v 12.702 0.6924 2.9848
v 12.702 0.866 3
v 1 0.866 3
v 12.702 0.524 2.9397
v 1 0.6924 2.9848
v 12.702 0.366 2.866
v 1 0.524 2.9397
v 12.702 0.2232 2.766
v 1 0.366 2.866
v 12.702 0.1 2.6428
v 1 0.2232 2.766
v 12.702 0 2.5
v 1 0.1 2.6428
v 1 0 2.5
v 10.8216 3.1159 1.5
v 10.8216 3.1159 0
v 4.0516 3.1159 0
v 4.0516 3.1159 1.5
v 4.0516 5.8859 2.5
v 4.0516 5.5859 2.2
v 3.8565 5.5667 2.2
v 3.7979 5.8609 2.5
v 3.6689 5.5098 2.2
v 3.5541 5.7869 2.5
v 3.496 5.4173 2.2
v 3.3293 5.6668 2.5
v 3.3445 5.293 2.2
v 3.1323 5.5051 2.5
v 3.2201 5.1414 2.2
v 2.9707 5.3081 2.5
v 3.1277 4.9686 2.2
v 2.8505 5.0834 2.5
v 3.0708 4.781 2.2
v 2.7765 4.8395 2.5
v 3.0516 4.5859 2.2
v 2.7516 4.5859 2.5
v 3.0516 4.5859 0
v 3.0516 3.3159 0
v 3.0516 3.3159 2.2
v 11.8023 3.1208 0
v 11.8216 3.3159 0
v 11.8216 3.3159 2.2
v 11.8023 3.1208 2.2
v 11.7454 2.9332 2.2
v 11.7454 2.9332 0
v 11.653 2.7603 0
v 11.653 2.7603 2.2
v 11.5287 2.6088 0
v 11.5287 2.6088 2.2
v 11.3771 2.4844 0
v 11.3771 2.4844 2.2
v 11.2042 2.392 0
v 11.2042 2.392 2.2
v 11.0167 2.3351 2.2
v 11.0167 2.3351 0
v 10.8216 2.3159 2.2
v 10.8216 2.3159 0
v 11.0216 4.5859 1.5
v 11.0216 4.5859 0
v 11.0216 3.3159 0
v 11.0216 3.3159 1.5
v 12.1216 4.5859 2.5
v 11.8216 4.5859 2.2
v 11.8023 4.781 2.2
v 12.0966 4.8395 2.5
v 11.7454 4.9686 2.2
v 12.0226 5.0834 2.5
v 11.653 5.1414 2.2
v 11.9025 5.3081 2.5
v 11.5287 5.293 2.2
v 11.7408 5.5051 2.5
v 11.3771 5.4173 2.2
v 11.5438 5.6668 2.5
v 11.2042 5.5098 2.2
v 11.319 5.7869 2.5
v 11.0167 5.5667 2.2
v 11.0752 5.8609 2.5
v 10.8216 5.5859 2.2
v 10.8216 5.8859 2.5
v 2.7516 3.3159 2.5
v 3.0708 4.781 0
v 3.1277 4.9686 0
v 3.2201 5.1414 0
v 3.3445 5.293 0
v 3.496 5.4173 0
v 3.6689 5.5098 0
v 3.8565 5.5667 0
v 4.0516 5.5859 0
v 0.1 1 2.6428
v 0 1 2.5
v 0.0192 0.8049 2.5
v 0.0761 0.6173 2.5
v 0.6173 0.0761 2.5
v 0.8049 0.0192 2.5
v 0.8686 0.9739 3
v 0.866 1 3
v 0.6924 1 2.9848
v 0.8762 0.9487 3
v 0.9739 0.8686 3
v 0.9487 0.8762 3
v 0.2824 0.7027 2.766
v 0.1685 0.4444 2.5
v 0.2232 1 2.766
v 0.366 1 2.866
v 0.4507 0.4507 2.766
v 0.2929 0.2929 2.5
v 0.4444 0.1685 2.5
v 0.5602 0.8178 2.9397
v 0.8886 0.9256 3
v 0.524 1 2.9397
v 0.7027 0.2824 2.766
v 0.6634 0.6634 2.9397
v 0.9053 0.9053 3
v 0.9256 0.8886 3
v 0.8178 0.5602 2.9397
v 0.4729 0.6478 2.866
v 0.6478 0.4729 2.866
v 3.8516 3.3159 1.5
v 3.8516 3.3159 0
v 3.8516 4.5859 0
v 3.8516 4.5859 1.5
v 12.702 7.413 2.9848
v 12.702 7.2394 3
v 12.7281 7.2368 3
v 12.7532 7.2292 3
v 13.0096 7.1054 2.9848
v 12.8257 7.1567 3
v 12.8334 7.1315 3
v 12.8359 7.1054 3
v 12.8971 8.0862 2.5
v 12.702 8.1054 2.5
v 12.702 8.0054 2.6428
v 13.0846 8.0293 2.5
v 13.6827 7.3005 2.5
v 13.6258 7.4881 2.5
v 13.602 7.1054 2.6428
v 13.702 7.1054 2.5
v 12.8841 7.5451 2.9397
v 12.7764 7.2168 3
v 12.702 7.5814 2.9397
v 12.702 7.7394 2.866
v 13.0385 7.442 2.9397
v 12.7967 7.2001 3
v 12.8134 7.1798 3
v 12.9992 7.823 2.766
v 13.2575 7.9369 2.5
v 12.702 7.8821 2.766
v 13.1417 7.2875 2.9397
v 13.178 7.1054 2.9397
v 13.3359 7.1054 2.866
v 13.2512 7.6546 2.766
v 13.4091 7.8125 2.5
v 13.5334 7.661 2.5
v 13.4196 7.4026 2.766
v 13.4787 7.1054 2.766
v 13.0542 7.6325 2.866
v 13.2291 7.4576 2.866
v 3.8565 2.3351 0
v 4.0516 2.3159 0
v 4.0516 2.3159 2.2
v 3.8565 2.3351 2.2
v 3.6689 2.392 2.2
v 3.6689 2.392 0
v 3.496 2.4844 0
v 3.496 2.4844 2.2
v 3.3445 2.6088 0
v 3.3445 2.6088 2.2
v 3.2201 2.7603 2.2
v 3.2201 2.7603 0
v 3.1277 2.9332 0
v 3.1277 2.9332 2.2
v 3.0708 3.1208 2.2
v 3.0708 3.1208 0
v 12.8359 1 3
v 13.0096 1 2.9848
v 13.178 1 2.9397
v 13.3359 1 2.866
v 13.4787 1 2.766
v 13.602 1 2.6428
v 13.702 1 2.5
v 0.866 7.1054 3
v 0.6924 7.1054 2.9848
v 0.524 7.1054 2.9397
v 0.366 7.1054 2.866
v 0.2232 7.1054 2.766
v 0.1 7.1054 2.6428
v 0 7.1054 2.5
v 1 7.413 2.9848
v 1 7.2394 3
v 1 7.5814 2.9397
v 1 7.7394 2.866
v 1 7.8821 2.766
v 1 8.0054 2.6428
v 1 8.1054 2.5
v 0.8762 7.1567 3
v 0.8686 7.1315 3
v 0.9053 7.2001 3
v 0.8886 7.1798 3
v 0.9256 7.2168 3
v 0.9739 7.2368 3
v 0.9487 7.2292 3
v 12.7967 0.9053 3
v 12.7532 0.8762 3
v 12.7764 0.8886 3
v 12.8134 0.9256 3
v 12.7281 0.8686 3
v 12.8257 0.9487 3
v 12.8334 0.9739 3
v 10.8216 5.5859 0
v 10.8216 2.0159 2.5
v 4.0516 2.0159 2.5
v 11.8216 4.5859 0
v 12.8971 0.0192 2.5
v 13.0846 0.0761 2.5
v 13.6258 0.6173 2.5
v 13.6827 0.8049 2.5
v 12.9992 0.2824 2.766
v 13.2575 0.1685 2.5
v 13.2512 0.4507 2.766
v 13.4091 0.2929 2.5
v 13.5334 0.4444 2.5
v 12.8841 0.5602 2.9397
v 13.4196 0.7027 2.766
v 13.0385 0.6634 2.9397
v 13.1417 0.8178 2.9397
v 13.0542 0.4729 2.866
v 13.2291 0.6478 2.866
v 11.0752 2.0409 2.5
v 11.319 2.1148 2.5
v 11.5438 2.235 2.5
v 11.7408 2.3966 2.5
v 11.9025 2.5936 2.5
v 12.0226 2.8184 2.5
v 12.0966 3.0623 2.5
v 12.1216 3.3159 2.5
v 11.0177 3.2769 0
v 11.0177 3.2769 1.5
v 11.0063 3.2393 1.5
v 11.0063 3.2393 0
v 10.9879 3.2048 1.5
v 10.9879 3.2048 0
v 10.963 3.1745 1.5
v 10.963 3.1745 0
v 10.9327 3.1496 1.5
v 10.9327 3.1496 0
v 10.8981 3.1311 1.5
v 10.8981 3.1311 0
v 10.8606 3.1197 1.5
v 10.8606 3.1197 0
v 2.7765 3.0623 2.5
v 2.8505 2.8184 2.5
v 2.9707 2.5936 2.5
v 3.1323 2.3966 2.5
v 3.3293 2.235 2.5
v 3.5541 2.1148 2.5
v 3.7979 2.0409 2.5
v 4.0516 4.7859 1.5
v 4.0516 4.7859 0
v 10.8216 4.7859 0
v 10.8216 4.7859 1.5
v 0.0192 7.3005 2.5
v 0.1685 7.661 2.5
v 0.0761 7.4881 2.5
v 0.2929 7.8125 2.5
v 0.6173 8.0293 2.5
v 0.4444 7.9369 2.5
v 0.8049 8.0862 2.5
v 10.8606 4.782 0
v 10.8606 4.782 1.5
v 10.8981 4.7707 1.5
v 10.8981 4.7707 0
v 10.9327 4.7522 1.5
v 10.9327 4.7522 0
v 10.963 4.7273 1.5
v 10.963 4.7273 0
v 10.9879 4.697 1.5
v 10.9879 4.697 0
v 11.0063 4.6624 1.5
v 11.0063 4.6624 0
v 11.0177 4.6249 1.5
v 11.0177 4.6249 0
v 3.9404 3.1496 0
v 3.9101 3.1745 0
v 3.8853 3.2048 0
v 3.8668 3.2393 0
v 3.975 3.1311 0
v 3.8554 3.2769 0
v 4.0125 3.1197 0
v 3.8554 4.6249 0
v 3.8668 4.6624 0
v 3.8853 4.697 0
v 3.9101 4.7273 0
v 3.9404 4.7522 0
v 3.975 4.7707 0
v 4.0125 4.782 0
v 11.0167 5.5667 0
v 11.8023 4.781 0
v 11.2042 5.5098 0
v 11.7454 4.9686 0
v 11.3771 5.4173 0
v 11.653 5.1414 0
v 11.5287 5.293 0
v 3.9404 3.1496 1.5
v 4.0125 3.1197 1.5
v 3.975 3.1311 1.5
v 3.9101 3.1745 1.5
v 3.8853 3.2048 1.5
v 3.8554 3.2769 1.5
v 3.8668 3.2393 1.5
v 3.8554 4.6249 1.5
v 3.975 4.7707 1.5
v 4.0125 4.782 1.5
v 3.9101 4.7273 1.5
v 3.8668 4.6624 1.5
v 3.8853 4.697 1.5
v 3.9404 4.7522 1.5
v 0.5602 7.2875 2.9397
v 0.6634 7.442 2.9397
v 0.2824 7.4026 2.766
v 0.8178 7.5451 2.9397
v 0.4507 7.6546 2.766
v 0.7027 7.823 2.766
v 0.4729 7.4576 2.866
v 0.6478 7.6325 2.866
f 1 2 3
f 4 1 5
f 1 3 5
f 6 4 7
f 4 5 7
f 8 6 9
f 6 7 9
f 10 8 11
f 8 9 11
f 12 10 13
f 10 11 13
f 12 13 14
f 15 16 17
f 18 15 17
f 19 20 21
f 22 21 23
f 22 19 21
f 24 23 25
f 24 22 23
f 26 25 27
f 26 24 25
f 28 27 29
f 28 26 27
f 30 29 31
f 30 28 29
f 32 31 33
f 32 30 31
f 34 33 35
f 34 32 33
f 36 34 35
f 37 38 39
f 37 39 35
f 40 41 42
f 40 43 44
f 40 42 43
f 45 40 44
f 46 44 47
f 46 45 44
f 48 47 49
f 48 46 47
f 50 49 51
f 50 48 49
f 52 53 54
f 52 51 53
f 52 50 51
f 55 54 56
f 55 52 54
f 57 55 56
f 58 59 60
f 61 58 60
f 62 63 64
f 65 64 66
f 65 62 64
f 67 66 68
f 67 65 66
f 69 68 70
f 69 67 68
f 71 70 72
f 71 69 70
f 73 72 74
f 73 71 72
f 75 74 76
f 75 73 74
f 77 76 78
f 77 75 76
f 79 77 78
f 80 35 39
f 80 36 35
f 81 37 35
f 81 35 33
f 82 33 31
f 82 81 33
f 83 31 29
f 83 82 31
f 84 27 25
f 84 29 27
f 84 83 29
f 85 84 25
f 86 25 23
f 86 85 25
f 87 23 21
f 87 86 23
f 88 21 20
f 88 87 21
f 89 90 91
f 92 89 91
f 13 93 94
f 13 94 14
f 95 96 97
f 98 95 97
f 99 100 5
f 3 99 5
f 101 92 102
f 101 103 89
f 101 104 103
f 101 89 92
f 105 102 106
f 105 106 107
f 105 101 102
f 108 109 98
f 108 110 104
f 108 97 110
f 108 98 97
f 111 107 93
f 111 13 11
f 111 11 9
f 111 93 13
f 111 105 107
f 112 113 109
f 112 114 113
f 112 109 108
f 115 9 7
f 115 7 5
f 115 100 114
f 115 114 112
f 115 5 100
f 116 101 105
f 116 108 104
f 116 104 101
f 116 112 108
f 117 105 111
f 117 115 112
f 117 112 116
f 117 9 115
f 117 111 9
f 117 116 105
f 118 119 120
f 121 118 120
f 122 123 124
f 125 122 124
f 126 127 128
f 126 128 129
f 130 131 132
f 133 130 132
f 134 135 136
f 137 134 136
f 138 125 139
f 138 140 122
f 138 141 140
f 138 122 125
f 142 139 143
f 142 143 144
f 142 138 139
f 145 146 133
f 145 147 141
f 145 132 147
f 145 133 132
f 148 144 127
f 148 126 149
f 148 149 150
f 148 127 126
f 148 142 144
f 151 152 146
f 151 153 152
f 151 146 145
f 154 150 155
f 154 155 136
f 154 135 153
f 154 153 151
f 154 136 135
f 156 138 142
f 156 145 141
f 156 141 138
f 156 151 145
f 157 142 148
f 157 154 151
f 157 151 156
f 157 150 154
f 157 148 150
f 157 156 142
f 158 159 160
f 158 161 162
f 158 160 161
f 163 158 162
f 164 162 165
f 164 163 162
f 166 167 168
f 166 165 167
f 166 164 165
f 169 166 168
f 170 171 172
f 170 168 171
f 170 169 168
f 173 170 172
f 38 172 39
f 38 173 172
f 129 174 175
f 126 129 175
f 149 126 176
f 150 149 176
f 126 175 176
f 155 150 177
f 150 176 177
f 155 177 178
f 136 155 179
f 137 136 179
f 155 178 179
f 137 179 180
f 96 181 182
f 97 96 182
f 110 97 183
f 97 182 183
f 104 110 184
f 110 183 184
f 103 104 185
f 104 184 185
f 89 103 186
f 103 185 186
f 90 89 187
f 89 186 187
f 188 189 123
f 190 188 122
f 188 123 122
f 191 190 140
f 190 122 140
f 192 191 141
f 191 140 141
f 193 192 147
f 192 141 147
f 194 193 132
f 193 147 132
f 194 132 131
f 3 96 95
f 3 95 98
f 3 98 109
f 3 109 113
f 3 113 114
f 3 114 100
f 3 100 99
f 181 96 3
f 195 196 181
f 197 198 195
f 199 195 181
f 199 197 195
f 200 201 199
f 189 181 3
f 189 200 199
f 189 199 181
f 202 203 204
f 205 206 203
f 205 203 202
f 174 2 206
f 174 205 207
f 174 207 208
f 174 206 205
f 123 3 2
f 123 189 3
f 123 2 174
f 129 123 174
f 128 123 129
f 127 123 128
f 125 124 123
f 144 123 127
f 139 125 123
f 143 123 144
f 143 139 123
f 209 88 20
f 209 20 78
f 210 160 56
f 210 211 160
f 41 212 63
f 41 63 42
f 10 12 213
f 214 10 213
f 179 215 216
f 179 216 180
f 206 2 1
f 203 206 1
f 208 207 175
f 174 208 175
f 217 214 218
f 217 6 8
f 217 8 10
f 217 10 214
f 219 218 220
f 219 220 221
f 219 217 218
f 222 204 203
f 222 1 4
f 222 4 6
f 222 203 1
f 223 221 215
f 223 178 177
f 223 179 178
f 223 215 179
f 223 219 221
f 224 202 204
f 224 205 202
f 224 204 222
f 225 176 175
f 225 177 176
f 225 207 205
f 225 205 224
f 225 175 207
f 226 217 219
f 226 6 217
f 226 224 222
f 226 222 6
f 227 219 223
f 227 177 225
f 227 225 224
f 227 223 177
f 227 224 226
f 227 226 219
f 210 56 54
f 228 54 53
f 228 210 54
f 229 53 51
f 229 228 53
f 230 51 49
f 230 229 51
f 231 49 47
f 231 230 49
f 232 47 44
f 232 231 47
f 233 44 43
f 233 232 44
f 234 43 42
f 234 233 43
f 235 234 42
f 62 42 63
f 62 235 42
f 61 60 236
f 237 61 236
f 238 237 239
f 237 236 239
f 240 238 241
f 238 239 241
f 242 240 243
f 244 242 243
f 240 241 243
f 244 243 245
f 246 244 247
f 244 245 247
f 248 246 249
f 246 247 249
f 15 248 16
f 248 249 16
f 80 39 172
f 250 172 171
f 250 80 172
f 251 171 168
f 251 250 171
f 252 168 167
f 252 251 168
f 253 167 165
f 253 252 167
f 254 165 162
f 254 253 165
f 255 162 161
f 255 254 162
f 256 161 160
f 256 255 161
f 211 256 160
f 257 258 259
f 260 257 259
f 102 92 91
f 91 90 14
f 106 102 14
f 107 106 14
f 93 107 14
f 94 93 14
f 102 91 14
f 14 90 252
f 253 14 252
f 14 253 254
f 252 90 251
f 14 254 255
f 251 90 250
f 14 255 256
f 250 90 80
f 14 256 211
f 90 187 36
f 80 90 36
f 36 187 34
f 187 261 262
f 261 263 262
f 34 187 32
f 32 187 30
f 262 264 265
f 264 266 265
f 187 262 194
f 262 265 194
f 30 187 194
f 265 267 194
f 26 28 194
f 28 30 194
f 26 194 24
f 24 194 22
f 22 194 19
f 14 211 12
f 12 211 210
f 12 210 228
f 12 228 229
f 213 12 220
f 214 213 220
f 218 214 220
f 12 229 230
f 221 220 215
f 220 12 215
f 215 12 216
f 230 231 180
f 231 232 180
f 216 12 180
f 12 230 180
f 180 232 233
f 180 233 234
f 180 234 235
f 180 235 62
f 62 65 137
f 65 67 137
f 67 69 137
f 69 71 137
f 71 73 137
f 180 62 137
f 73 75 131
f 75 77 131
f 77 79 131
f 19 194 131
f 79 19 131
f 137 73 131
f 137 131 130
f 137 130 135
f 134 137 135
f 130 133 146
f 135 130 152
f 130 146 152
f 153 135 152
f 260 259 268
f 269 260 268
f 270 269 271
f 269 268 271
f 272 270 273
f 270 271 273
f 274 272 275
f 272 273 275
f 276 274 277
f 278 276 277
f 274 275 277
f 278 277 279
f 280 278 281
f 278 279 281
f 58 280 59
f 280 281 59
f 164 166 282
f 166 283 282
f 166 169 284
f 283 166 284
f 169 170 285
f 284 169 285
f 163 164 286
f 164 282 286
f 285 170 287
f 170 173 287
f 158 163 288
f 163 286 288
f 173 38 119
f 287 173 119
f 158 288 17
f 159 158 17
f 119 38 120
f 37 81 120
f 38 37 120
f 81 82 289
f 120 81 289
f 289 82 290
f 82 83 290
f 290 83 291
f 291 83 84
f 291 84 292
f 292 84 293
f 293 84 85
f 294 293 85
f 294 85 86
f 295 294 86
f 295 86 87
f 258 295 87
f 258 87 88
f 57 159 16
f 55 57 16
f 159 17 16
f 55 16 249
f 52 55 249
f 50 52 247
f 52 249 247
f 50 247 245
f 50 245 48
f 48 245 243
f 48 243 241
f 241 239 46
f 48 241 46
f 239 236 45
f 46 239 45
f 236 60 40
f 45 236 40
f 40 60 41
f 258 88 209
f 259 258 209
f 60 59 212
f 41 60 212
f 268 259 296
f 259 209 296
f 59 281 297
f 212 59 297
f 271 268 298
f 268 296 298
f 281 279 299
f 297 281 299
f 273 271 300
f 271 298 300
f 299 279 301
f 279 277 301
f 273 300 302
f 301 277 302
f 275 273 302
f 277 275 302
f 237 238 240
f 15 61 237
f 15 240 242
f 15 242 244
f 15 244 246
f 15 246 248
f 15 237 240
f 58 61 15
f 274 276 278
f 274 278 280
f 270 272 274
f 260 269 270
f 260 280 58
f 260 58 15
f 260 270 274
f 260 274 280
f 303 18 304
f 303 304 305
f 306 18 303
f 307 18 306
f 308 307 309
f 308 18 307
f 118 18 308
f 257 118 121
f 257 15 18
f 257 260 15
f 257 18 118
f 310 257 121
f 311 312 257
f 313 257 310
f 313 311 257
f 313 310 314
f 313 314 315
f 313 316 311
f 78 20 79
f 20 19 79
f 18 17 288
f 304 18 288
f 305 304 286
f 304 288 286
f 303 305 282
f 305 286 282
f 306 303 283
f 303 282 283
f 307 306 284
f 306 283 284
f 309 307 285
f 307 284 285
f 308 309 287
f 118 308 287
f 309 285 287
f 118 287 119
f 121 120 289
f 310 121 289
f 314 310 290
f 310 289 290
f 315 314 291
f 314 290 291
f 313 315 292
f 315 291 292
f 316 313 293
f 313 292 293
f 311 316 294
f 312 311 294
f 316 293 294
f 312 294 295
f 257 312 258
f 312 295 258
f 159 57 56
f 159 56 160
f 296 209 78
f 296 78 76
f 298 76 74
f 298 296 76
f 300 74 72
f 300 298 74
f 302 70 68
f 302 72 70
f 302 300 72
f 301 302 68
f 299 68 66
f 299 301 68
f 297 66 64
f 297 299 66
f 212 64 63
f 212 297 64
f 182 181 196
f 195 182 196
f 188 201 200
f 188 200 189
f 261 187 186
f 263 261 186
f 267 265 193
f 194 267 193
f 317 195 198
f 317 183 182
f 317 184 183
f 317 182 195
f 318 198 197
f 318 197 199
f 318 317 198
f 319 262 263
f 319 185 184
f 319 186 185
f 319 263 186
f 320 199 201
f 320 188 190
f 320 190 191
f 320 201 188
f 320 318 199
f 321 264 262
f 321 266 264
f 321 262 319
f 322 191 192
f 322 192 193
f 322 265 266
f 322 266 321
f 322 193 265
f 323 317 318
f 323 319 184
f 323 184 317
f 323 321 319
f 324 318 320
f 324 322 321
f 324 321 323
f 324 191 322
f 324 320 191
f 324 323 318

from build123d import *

# Parameters (mm, degrees)
SKETCH1_W           = 13.701960198
SKETCH1_H           = 8.105384906
BOSS_EXTRUDE1_DEPTH = 3
CAVITY1_OUTLINE_W   = 13.701960198
CAVITY1_OUTLINE_H   = 8.105384906
CAVITY1_DEPTH       = 2.5
CUT_EXTRUDE1_DEPTH  = 1.5
FILLET1_R           = 1
FILLET2_R           = 1


with BuildPart() as part:
    # Sketch1 → Boss-Extrude1 (new body)
    with BuildSketch(Plane.XY):
        with Locations((6.850980099, 4.052692453)):
            Rectangle(SKETCH1_W, SKETCH1_H)
    extrude(amount=BOSS_EXTRUDE1_DEPTH)

    # Cavity1: read off the stored shape, not the designer's step
    # Cavity1 outline → Cavity1 (cut)
    with BuildSketch(Plane.XY):
        with Locations((6.850980099, 4.052692453)):
            Rectangle(CAVITY1_OUTLINE_W, CAVITY1_OUTLINE_H)
        with BuildLine():
            Line((11.821561481, 4.585876247), (11.821561481, 3.315876247))
            ThreePointArc((11.821561481, 3.315876247), (11.528668262, 2.608769466), (10.821561481, 2.315876247))
            Line((10.821561481, 2.315876247), (4.051561481, 2.315876247))
            ThreePointArc((4.051561481, 2.315876247), (3.3444547, 2.608769466), (3.051561481, 3.315876247))
            Line((3.051561481, 3.315876247), (3.051561481, 4.585876247))
            ThreePointArc((3.051561481, 4.585876247), (3.3444547, 5.292983028), (4.051561481, 5.585876247))
            Line((4.051561481, 5.585876247), (10.821561481, 5.585876247))
            ThreePointArc((10.821561481, 5.585876247), (11.528668262, 5.292983028), (11.821561481, 4.585876247))
        make_face(mode=Mode.SUBTRACT)
    extrude(amount=CAVITY1_DEPTH, mode=Mode.SUBTRACT)

    # Cavity1 2: loft between two sections, ruled curve by curve
    cavity1_2_from = [
        Edge.make_three_point_arc((3.051561481, 3.315876247, 2.2), (3.3444547, 2.608769466, 2.2), (4.051561481, 2.315876247, 2.2)),
        Edge.make_three_point_arc((4.051561481, 5.585876247, 2.2), (3.3444547, 5.292983028, 2.2), (3.051561481, 4.585876247, 2.2)),
        Edge.make_three_point_arc((10.821561481, 2.315876247, 2.2), (11.528668262, 2.608769466, 2.2), (11.821561481, 3.315876247, 2.2)),
        Edge.make_three_point_arc((11.821561481, 4.585876247, 2.2), (11.528668262, 5.292983028, 2.2), (10.821561481, 5.585876247, 2.2)),
        Edge.make_line((3.051561481, 4.585876247, 2.2), (3.051561481, 3.315876247, 2.2)),
        Edge.make_line((4.051561481, 2.315876247, 2.2), (10.821561481, 2.315876247, 2.2)),
        Edge.make_line((4.051561481, 5.585876247, 2.2), (10.821561481, 5.585876247, 2.2)),
        Edge.make_line((11.821561481, 3.315876247, 2.2), (11.821561481, 4.585876247, 2.2)),
    ]
    cavity1_2_to = [
        Edge.make_three_point_arc((2.751561481, 3.315876247, 2.5), (3.132322665, 2.396637431, 2.5), (4.051561481, 2.015876247, 2.5)),
        Edge.make_three_point_arc((4.051561481, 5.885876247, 2.5), (3.132322665, 5.505115063, 2.5), (2.751561481, 4.585876247, 2.5)),
        Edge.make_three_point_arc((10.821561481, 2.015876247, 2.5), (11.740800297, 2.396637431, 2.5), (12.121561481, 3.315876247, 2.5)),
        Edge.make_three_point_arc((12.121561481, 4.585876247, 2.5), (11.740800297, 5.505115063, 2.5), (10.821561481, 5.885876247, 2.5)),
        Edge.make_line((2.751561481, 4.585876247, 2.5), (2.751561481, 3.315876247, 2.5)),
        Edge.make_line((4.051561481, 2.015876247, 2.5), (10.821561481, 2.015876247, 2.5)),
        Edge.make_line((4.051561481, 5.885876247, 2.5), (10.821561481, 5.885876247, 2.5)),
        Edge.make_line((12.121561481, 3.315876247, 2.5), (12.121561481, 4.585876247, 2.5)),
    ]
    cavity1_2 = Solid(Shell([*[Face.make_surface_from_curves(cavity1_2_from[k], cavity1_2_to[k]) for k in range(8)], Face(Wire(cavity1_2_from)), Face(Wire(cavity1_2_to))]))
    add(cavity1_2)

    # Sketch2 → Cut-Extrude1 (cut)
    with BuildSketch(Plane(origin=(0, 0, 0), x_dir=(-1, 0, 0), z_dir=(0, 0, -1))):
        with BuildLine():
            Line((-3.851561481, 3.315876247), (-3.851561481, 4.585876247))
            ThreePointArc((-3.851561481, 4.585876247), (-3.910140125, 4.727297603), (-4.051561481, 4.785876247))
            Line((-4.051561481, 4.785876247), (-10.821561481, 4.785876247))
            ThreePointArc((-10.821561481, 4.785876247), (-10.962982837, 4.727297603), (-11.021561481, 4.585876247))
            Line((-11.021561481, 4.585876247), (-11.021561481, 3.315876247))
            ThreePointArc((-11.021561481, 3.315876247), (-10.962982837, 3.174454891), (-10.821561481, 3.115876247))
            Line((-10.821561481, 3.115876247), (-4.051561481, 3.115876247))
            ThreePointArc((-4.051561481, 3.115876247), (-3.910140125, 3.174454891), (-3.851561481, 3.315876247))
        make_face()
    extrude(amount=-CUT_EXTRUDE1_DEPTH, mode=Mode.SUBTRACT)

    # Fillet1
    fillet1_edges = [part.edges().sort_by_distance(p)[0] for p in [
        (0, 8.105384906, 2.75),
        (13.701960198, 8.105384906, 2.75),
        (13.701960198, 0, 2.75),
        (0, 0, 2.75),
    ]]
    fillet(fillet1_edges, radius=FILLET1_R)

    # Fillet2
    # the kernel refuses this fillet: 1 mm, written as the material it takes off along each edge
    with BuildSketch(Plane(origin=(1, 1, 3), x_dir=(-1, 0, 0), z_dir=(0, 1, 0))) as fillet2_piece_1:
        with BuildLine():
            CenterArc((0.133974596, -1), FILLET2_R, 30, 60)
            Line((0.133974596, 0), (0.133974596, 0.02))
            Line((0.133974596, 0.02), (1, 0.02))
            Line((1, 0.02), (1.02, 0))
            ThreePointArc((1.02, 0), (1.02, -0.25), (1.017320508, -0.49))
            Line((1.017320508, -0.49), (1, -0.5))
        make_face()
    revolve(axis=Axis((1, 1, 3), (0, 0, 1)), revolution_arc=90, mode=Mode.SUBTRACT)
    with BuildSketch(Plane(origin=(0, 7.105384906, 3), x_dir=(0, 0, -1), z_dir=(0, -1, 0)), Plane(origin=(13.701960198, 1, 3), x_dir=(-5.230269550793082e-10, 0, -1.0), z_dir=(0, 1, 0))) as fillet2_piece_2:
        with BuildLine():
            CenterArc((1, 0.866025404), FILLET2_R, 180, 60)
            Line((0, 0.866025404), (-0.02, 0.866025404))
            Line((-0.02, 0.866025404), (-0.02, 0))
            Line((-0.02, 0), (0, -0.02))
            ThreePointArc((0, -0.02), (0.25, -0.02), (0.49, -0.017320508))
            Line((0.49, -0.017320508), (0.5, 0))
        make_face()
    extrude(amount=6.105384906, mode=Mode.SUBTRACT)
    with BuildSketch(Plane(origin=(1, 7.105384906, 3), x_dir=(-1, 0, 0), z_dir=(0, -1, 0))) as fillet2_piece_3:
        with BuildLine():
            CenterArc((0.133974596, 1), FILLET2_R, 270, 60)
            Line((0.133974596, 0), (0.133974596, -0.02))
            Line((0.133974596, -0.02), (1, -0.02))
            Line((1, -0.02), (1.02, 0))
            ThreePointArc((1.02, 0), (1.02, 0.25), (1.017320508, 0.49))
            Line((1.017320508, 0.49), (1, 0.5))
        make_face()
    revolve(axis=Axis((1, 7.105384906, 3), (0, 0, -1)), revolution_arc=90, mode=Mode.SUBTRACT)
    with BuildSketch(Plane(origin=(12.701960198, 8.105384906, 3), x_dir=(0, -2.7725377549357952e-11, -1.0), z_dir=(-1, 0, 0)), Plane(origin=(1, 0, 3), x_dir=(0, 0, -1), z_dir=(1, 0, 0))) as fillet2_piece_4:
        with BuildLine():
            CenterArc((1, 0.866025404), FILLET2_R, 179.999999998, 60)
            Line((0, 0.866025404), (-0.02, 0.866025404))
            Line((-0.02, 0.866025404), (-0.02, 0))
            Line((-0.02, 0), (0, -0.02))
            ThreePointArc((0, -0.02), (0.25, -0.02), (0.49, -0.017320508))
            Line((0.49, -0.017320508), (0.5, 0))
        make_face()
    extrude(amount=11.701960198, mode=Mode.SUBTRACT)
    with BuildSketch(Plane(origin=(12.701960198, 7.105384906, 3), x_dir=(0, 1, 0), z_dir=(-1, 0, 0))) as fillet2_piece_5:
        with BuildLine():
            CenterArc((0.133974596, 1), FILLET2_R, 270, 60)
            Line((0.133974596, 0), (0.133974596, -0.02))
            Line((0.133974596, -0.02), (1, -0.02))
            Line((1, -0.02), (1.02, 0))
            ThreePointArc((1.02, 0), (1.02, 0.25), (1.017320508, 0.49))
            Line((1.017320508, 0.49), (1, 0.5))
        make_face()
    revolve(axis=Axis((12.701960198, 7.105384906, 3), (0, 0, -1)), revolution_arc=90, mode=Mode.SUBTRACT)
    with BuildSketch(Plane(origin=(12.701960198, 1, 3), x_dir=(0, -1, 0), z_dir=(-1, 0, 0))) as fillet2_piece_6:
        with BuildLine():
            CenterArc((0.133974596, -1), FILLET2_R, 30, 60)
            Line((0.133974596, 0), (0.133974596, 0.02))
            Line((0.133974596, 0.02), (1, 0.02))
            Line((1, 0.02), (1.02, 0))
            ThreePointArc((1.02, 0), (1.02, -0.25), (1.017320508, -0.49))
            Line((1.017320508, -0.49), (1, -0.5))
        make_face()
    revolve(axis=Axis((12.701960198, 1, 3), (0, 0, 1)), revolution_arc=90, mode=Mode.SUBTRACT)


solid = part.part
